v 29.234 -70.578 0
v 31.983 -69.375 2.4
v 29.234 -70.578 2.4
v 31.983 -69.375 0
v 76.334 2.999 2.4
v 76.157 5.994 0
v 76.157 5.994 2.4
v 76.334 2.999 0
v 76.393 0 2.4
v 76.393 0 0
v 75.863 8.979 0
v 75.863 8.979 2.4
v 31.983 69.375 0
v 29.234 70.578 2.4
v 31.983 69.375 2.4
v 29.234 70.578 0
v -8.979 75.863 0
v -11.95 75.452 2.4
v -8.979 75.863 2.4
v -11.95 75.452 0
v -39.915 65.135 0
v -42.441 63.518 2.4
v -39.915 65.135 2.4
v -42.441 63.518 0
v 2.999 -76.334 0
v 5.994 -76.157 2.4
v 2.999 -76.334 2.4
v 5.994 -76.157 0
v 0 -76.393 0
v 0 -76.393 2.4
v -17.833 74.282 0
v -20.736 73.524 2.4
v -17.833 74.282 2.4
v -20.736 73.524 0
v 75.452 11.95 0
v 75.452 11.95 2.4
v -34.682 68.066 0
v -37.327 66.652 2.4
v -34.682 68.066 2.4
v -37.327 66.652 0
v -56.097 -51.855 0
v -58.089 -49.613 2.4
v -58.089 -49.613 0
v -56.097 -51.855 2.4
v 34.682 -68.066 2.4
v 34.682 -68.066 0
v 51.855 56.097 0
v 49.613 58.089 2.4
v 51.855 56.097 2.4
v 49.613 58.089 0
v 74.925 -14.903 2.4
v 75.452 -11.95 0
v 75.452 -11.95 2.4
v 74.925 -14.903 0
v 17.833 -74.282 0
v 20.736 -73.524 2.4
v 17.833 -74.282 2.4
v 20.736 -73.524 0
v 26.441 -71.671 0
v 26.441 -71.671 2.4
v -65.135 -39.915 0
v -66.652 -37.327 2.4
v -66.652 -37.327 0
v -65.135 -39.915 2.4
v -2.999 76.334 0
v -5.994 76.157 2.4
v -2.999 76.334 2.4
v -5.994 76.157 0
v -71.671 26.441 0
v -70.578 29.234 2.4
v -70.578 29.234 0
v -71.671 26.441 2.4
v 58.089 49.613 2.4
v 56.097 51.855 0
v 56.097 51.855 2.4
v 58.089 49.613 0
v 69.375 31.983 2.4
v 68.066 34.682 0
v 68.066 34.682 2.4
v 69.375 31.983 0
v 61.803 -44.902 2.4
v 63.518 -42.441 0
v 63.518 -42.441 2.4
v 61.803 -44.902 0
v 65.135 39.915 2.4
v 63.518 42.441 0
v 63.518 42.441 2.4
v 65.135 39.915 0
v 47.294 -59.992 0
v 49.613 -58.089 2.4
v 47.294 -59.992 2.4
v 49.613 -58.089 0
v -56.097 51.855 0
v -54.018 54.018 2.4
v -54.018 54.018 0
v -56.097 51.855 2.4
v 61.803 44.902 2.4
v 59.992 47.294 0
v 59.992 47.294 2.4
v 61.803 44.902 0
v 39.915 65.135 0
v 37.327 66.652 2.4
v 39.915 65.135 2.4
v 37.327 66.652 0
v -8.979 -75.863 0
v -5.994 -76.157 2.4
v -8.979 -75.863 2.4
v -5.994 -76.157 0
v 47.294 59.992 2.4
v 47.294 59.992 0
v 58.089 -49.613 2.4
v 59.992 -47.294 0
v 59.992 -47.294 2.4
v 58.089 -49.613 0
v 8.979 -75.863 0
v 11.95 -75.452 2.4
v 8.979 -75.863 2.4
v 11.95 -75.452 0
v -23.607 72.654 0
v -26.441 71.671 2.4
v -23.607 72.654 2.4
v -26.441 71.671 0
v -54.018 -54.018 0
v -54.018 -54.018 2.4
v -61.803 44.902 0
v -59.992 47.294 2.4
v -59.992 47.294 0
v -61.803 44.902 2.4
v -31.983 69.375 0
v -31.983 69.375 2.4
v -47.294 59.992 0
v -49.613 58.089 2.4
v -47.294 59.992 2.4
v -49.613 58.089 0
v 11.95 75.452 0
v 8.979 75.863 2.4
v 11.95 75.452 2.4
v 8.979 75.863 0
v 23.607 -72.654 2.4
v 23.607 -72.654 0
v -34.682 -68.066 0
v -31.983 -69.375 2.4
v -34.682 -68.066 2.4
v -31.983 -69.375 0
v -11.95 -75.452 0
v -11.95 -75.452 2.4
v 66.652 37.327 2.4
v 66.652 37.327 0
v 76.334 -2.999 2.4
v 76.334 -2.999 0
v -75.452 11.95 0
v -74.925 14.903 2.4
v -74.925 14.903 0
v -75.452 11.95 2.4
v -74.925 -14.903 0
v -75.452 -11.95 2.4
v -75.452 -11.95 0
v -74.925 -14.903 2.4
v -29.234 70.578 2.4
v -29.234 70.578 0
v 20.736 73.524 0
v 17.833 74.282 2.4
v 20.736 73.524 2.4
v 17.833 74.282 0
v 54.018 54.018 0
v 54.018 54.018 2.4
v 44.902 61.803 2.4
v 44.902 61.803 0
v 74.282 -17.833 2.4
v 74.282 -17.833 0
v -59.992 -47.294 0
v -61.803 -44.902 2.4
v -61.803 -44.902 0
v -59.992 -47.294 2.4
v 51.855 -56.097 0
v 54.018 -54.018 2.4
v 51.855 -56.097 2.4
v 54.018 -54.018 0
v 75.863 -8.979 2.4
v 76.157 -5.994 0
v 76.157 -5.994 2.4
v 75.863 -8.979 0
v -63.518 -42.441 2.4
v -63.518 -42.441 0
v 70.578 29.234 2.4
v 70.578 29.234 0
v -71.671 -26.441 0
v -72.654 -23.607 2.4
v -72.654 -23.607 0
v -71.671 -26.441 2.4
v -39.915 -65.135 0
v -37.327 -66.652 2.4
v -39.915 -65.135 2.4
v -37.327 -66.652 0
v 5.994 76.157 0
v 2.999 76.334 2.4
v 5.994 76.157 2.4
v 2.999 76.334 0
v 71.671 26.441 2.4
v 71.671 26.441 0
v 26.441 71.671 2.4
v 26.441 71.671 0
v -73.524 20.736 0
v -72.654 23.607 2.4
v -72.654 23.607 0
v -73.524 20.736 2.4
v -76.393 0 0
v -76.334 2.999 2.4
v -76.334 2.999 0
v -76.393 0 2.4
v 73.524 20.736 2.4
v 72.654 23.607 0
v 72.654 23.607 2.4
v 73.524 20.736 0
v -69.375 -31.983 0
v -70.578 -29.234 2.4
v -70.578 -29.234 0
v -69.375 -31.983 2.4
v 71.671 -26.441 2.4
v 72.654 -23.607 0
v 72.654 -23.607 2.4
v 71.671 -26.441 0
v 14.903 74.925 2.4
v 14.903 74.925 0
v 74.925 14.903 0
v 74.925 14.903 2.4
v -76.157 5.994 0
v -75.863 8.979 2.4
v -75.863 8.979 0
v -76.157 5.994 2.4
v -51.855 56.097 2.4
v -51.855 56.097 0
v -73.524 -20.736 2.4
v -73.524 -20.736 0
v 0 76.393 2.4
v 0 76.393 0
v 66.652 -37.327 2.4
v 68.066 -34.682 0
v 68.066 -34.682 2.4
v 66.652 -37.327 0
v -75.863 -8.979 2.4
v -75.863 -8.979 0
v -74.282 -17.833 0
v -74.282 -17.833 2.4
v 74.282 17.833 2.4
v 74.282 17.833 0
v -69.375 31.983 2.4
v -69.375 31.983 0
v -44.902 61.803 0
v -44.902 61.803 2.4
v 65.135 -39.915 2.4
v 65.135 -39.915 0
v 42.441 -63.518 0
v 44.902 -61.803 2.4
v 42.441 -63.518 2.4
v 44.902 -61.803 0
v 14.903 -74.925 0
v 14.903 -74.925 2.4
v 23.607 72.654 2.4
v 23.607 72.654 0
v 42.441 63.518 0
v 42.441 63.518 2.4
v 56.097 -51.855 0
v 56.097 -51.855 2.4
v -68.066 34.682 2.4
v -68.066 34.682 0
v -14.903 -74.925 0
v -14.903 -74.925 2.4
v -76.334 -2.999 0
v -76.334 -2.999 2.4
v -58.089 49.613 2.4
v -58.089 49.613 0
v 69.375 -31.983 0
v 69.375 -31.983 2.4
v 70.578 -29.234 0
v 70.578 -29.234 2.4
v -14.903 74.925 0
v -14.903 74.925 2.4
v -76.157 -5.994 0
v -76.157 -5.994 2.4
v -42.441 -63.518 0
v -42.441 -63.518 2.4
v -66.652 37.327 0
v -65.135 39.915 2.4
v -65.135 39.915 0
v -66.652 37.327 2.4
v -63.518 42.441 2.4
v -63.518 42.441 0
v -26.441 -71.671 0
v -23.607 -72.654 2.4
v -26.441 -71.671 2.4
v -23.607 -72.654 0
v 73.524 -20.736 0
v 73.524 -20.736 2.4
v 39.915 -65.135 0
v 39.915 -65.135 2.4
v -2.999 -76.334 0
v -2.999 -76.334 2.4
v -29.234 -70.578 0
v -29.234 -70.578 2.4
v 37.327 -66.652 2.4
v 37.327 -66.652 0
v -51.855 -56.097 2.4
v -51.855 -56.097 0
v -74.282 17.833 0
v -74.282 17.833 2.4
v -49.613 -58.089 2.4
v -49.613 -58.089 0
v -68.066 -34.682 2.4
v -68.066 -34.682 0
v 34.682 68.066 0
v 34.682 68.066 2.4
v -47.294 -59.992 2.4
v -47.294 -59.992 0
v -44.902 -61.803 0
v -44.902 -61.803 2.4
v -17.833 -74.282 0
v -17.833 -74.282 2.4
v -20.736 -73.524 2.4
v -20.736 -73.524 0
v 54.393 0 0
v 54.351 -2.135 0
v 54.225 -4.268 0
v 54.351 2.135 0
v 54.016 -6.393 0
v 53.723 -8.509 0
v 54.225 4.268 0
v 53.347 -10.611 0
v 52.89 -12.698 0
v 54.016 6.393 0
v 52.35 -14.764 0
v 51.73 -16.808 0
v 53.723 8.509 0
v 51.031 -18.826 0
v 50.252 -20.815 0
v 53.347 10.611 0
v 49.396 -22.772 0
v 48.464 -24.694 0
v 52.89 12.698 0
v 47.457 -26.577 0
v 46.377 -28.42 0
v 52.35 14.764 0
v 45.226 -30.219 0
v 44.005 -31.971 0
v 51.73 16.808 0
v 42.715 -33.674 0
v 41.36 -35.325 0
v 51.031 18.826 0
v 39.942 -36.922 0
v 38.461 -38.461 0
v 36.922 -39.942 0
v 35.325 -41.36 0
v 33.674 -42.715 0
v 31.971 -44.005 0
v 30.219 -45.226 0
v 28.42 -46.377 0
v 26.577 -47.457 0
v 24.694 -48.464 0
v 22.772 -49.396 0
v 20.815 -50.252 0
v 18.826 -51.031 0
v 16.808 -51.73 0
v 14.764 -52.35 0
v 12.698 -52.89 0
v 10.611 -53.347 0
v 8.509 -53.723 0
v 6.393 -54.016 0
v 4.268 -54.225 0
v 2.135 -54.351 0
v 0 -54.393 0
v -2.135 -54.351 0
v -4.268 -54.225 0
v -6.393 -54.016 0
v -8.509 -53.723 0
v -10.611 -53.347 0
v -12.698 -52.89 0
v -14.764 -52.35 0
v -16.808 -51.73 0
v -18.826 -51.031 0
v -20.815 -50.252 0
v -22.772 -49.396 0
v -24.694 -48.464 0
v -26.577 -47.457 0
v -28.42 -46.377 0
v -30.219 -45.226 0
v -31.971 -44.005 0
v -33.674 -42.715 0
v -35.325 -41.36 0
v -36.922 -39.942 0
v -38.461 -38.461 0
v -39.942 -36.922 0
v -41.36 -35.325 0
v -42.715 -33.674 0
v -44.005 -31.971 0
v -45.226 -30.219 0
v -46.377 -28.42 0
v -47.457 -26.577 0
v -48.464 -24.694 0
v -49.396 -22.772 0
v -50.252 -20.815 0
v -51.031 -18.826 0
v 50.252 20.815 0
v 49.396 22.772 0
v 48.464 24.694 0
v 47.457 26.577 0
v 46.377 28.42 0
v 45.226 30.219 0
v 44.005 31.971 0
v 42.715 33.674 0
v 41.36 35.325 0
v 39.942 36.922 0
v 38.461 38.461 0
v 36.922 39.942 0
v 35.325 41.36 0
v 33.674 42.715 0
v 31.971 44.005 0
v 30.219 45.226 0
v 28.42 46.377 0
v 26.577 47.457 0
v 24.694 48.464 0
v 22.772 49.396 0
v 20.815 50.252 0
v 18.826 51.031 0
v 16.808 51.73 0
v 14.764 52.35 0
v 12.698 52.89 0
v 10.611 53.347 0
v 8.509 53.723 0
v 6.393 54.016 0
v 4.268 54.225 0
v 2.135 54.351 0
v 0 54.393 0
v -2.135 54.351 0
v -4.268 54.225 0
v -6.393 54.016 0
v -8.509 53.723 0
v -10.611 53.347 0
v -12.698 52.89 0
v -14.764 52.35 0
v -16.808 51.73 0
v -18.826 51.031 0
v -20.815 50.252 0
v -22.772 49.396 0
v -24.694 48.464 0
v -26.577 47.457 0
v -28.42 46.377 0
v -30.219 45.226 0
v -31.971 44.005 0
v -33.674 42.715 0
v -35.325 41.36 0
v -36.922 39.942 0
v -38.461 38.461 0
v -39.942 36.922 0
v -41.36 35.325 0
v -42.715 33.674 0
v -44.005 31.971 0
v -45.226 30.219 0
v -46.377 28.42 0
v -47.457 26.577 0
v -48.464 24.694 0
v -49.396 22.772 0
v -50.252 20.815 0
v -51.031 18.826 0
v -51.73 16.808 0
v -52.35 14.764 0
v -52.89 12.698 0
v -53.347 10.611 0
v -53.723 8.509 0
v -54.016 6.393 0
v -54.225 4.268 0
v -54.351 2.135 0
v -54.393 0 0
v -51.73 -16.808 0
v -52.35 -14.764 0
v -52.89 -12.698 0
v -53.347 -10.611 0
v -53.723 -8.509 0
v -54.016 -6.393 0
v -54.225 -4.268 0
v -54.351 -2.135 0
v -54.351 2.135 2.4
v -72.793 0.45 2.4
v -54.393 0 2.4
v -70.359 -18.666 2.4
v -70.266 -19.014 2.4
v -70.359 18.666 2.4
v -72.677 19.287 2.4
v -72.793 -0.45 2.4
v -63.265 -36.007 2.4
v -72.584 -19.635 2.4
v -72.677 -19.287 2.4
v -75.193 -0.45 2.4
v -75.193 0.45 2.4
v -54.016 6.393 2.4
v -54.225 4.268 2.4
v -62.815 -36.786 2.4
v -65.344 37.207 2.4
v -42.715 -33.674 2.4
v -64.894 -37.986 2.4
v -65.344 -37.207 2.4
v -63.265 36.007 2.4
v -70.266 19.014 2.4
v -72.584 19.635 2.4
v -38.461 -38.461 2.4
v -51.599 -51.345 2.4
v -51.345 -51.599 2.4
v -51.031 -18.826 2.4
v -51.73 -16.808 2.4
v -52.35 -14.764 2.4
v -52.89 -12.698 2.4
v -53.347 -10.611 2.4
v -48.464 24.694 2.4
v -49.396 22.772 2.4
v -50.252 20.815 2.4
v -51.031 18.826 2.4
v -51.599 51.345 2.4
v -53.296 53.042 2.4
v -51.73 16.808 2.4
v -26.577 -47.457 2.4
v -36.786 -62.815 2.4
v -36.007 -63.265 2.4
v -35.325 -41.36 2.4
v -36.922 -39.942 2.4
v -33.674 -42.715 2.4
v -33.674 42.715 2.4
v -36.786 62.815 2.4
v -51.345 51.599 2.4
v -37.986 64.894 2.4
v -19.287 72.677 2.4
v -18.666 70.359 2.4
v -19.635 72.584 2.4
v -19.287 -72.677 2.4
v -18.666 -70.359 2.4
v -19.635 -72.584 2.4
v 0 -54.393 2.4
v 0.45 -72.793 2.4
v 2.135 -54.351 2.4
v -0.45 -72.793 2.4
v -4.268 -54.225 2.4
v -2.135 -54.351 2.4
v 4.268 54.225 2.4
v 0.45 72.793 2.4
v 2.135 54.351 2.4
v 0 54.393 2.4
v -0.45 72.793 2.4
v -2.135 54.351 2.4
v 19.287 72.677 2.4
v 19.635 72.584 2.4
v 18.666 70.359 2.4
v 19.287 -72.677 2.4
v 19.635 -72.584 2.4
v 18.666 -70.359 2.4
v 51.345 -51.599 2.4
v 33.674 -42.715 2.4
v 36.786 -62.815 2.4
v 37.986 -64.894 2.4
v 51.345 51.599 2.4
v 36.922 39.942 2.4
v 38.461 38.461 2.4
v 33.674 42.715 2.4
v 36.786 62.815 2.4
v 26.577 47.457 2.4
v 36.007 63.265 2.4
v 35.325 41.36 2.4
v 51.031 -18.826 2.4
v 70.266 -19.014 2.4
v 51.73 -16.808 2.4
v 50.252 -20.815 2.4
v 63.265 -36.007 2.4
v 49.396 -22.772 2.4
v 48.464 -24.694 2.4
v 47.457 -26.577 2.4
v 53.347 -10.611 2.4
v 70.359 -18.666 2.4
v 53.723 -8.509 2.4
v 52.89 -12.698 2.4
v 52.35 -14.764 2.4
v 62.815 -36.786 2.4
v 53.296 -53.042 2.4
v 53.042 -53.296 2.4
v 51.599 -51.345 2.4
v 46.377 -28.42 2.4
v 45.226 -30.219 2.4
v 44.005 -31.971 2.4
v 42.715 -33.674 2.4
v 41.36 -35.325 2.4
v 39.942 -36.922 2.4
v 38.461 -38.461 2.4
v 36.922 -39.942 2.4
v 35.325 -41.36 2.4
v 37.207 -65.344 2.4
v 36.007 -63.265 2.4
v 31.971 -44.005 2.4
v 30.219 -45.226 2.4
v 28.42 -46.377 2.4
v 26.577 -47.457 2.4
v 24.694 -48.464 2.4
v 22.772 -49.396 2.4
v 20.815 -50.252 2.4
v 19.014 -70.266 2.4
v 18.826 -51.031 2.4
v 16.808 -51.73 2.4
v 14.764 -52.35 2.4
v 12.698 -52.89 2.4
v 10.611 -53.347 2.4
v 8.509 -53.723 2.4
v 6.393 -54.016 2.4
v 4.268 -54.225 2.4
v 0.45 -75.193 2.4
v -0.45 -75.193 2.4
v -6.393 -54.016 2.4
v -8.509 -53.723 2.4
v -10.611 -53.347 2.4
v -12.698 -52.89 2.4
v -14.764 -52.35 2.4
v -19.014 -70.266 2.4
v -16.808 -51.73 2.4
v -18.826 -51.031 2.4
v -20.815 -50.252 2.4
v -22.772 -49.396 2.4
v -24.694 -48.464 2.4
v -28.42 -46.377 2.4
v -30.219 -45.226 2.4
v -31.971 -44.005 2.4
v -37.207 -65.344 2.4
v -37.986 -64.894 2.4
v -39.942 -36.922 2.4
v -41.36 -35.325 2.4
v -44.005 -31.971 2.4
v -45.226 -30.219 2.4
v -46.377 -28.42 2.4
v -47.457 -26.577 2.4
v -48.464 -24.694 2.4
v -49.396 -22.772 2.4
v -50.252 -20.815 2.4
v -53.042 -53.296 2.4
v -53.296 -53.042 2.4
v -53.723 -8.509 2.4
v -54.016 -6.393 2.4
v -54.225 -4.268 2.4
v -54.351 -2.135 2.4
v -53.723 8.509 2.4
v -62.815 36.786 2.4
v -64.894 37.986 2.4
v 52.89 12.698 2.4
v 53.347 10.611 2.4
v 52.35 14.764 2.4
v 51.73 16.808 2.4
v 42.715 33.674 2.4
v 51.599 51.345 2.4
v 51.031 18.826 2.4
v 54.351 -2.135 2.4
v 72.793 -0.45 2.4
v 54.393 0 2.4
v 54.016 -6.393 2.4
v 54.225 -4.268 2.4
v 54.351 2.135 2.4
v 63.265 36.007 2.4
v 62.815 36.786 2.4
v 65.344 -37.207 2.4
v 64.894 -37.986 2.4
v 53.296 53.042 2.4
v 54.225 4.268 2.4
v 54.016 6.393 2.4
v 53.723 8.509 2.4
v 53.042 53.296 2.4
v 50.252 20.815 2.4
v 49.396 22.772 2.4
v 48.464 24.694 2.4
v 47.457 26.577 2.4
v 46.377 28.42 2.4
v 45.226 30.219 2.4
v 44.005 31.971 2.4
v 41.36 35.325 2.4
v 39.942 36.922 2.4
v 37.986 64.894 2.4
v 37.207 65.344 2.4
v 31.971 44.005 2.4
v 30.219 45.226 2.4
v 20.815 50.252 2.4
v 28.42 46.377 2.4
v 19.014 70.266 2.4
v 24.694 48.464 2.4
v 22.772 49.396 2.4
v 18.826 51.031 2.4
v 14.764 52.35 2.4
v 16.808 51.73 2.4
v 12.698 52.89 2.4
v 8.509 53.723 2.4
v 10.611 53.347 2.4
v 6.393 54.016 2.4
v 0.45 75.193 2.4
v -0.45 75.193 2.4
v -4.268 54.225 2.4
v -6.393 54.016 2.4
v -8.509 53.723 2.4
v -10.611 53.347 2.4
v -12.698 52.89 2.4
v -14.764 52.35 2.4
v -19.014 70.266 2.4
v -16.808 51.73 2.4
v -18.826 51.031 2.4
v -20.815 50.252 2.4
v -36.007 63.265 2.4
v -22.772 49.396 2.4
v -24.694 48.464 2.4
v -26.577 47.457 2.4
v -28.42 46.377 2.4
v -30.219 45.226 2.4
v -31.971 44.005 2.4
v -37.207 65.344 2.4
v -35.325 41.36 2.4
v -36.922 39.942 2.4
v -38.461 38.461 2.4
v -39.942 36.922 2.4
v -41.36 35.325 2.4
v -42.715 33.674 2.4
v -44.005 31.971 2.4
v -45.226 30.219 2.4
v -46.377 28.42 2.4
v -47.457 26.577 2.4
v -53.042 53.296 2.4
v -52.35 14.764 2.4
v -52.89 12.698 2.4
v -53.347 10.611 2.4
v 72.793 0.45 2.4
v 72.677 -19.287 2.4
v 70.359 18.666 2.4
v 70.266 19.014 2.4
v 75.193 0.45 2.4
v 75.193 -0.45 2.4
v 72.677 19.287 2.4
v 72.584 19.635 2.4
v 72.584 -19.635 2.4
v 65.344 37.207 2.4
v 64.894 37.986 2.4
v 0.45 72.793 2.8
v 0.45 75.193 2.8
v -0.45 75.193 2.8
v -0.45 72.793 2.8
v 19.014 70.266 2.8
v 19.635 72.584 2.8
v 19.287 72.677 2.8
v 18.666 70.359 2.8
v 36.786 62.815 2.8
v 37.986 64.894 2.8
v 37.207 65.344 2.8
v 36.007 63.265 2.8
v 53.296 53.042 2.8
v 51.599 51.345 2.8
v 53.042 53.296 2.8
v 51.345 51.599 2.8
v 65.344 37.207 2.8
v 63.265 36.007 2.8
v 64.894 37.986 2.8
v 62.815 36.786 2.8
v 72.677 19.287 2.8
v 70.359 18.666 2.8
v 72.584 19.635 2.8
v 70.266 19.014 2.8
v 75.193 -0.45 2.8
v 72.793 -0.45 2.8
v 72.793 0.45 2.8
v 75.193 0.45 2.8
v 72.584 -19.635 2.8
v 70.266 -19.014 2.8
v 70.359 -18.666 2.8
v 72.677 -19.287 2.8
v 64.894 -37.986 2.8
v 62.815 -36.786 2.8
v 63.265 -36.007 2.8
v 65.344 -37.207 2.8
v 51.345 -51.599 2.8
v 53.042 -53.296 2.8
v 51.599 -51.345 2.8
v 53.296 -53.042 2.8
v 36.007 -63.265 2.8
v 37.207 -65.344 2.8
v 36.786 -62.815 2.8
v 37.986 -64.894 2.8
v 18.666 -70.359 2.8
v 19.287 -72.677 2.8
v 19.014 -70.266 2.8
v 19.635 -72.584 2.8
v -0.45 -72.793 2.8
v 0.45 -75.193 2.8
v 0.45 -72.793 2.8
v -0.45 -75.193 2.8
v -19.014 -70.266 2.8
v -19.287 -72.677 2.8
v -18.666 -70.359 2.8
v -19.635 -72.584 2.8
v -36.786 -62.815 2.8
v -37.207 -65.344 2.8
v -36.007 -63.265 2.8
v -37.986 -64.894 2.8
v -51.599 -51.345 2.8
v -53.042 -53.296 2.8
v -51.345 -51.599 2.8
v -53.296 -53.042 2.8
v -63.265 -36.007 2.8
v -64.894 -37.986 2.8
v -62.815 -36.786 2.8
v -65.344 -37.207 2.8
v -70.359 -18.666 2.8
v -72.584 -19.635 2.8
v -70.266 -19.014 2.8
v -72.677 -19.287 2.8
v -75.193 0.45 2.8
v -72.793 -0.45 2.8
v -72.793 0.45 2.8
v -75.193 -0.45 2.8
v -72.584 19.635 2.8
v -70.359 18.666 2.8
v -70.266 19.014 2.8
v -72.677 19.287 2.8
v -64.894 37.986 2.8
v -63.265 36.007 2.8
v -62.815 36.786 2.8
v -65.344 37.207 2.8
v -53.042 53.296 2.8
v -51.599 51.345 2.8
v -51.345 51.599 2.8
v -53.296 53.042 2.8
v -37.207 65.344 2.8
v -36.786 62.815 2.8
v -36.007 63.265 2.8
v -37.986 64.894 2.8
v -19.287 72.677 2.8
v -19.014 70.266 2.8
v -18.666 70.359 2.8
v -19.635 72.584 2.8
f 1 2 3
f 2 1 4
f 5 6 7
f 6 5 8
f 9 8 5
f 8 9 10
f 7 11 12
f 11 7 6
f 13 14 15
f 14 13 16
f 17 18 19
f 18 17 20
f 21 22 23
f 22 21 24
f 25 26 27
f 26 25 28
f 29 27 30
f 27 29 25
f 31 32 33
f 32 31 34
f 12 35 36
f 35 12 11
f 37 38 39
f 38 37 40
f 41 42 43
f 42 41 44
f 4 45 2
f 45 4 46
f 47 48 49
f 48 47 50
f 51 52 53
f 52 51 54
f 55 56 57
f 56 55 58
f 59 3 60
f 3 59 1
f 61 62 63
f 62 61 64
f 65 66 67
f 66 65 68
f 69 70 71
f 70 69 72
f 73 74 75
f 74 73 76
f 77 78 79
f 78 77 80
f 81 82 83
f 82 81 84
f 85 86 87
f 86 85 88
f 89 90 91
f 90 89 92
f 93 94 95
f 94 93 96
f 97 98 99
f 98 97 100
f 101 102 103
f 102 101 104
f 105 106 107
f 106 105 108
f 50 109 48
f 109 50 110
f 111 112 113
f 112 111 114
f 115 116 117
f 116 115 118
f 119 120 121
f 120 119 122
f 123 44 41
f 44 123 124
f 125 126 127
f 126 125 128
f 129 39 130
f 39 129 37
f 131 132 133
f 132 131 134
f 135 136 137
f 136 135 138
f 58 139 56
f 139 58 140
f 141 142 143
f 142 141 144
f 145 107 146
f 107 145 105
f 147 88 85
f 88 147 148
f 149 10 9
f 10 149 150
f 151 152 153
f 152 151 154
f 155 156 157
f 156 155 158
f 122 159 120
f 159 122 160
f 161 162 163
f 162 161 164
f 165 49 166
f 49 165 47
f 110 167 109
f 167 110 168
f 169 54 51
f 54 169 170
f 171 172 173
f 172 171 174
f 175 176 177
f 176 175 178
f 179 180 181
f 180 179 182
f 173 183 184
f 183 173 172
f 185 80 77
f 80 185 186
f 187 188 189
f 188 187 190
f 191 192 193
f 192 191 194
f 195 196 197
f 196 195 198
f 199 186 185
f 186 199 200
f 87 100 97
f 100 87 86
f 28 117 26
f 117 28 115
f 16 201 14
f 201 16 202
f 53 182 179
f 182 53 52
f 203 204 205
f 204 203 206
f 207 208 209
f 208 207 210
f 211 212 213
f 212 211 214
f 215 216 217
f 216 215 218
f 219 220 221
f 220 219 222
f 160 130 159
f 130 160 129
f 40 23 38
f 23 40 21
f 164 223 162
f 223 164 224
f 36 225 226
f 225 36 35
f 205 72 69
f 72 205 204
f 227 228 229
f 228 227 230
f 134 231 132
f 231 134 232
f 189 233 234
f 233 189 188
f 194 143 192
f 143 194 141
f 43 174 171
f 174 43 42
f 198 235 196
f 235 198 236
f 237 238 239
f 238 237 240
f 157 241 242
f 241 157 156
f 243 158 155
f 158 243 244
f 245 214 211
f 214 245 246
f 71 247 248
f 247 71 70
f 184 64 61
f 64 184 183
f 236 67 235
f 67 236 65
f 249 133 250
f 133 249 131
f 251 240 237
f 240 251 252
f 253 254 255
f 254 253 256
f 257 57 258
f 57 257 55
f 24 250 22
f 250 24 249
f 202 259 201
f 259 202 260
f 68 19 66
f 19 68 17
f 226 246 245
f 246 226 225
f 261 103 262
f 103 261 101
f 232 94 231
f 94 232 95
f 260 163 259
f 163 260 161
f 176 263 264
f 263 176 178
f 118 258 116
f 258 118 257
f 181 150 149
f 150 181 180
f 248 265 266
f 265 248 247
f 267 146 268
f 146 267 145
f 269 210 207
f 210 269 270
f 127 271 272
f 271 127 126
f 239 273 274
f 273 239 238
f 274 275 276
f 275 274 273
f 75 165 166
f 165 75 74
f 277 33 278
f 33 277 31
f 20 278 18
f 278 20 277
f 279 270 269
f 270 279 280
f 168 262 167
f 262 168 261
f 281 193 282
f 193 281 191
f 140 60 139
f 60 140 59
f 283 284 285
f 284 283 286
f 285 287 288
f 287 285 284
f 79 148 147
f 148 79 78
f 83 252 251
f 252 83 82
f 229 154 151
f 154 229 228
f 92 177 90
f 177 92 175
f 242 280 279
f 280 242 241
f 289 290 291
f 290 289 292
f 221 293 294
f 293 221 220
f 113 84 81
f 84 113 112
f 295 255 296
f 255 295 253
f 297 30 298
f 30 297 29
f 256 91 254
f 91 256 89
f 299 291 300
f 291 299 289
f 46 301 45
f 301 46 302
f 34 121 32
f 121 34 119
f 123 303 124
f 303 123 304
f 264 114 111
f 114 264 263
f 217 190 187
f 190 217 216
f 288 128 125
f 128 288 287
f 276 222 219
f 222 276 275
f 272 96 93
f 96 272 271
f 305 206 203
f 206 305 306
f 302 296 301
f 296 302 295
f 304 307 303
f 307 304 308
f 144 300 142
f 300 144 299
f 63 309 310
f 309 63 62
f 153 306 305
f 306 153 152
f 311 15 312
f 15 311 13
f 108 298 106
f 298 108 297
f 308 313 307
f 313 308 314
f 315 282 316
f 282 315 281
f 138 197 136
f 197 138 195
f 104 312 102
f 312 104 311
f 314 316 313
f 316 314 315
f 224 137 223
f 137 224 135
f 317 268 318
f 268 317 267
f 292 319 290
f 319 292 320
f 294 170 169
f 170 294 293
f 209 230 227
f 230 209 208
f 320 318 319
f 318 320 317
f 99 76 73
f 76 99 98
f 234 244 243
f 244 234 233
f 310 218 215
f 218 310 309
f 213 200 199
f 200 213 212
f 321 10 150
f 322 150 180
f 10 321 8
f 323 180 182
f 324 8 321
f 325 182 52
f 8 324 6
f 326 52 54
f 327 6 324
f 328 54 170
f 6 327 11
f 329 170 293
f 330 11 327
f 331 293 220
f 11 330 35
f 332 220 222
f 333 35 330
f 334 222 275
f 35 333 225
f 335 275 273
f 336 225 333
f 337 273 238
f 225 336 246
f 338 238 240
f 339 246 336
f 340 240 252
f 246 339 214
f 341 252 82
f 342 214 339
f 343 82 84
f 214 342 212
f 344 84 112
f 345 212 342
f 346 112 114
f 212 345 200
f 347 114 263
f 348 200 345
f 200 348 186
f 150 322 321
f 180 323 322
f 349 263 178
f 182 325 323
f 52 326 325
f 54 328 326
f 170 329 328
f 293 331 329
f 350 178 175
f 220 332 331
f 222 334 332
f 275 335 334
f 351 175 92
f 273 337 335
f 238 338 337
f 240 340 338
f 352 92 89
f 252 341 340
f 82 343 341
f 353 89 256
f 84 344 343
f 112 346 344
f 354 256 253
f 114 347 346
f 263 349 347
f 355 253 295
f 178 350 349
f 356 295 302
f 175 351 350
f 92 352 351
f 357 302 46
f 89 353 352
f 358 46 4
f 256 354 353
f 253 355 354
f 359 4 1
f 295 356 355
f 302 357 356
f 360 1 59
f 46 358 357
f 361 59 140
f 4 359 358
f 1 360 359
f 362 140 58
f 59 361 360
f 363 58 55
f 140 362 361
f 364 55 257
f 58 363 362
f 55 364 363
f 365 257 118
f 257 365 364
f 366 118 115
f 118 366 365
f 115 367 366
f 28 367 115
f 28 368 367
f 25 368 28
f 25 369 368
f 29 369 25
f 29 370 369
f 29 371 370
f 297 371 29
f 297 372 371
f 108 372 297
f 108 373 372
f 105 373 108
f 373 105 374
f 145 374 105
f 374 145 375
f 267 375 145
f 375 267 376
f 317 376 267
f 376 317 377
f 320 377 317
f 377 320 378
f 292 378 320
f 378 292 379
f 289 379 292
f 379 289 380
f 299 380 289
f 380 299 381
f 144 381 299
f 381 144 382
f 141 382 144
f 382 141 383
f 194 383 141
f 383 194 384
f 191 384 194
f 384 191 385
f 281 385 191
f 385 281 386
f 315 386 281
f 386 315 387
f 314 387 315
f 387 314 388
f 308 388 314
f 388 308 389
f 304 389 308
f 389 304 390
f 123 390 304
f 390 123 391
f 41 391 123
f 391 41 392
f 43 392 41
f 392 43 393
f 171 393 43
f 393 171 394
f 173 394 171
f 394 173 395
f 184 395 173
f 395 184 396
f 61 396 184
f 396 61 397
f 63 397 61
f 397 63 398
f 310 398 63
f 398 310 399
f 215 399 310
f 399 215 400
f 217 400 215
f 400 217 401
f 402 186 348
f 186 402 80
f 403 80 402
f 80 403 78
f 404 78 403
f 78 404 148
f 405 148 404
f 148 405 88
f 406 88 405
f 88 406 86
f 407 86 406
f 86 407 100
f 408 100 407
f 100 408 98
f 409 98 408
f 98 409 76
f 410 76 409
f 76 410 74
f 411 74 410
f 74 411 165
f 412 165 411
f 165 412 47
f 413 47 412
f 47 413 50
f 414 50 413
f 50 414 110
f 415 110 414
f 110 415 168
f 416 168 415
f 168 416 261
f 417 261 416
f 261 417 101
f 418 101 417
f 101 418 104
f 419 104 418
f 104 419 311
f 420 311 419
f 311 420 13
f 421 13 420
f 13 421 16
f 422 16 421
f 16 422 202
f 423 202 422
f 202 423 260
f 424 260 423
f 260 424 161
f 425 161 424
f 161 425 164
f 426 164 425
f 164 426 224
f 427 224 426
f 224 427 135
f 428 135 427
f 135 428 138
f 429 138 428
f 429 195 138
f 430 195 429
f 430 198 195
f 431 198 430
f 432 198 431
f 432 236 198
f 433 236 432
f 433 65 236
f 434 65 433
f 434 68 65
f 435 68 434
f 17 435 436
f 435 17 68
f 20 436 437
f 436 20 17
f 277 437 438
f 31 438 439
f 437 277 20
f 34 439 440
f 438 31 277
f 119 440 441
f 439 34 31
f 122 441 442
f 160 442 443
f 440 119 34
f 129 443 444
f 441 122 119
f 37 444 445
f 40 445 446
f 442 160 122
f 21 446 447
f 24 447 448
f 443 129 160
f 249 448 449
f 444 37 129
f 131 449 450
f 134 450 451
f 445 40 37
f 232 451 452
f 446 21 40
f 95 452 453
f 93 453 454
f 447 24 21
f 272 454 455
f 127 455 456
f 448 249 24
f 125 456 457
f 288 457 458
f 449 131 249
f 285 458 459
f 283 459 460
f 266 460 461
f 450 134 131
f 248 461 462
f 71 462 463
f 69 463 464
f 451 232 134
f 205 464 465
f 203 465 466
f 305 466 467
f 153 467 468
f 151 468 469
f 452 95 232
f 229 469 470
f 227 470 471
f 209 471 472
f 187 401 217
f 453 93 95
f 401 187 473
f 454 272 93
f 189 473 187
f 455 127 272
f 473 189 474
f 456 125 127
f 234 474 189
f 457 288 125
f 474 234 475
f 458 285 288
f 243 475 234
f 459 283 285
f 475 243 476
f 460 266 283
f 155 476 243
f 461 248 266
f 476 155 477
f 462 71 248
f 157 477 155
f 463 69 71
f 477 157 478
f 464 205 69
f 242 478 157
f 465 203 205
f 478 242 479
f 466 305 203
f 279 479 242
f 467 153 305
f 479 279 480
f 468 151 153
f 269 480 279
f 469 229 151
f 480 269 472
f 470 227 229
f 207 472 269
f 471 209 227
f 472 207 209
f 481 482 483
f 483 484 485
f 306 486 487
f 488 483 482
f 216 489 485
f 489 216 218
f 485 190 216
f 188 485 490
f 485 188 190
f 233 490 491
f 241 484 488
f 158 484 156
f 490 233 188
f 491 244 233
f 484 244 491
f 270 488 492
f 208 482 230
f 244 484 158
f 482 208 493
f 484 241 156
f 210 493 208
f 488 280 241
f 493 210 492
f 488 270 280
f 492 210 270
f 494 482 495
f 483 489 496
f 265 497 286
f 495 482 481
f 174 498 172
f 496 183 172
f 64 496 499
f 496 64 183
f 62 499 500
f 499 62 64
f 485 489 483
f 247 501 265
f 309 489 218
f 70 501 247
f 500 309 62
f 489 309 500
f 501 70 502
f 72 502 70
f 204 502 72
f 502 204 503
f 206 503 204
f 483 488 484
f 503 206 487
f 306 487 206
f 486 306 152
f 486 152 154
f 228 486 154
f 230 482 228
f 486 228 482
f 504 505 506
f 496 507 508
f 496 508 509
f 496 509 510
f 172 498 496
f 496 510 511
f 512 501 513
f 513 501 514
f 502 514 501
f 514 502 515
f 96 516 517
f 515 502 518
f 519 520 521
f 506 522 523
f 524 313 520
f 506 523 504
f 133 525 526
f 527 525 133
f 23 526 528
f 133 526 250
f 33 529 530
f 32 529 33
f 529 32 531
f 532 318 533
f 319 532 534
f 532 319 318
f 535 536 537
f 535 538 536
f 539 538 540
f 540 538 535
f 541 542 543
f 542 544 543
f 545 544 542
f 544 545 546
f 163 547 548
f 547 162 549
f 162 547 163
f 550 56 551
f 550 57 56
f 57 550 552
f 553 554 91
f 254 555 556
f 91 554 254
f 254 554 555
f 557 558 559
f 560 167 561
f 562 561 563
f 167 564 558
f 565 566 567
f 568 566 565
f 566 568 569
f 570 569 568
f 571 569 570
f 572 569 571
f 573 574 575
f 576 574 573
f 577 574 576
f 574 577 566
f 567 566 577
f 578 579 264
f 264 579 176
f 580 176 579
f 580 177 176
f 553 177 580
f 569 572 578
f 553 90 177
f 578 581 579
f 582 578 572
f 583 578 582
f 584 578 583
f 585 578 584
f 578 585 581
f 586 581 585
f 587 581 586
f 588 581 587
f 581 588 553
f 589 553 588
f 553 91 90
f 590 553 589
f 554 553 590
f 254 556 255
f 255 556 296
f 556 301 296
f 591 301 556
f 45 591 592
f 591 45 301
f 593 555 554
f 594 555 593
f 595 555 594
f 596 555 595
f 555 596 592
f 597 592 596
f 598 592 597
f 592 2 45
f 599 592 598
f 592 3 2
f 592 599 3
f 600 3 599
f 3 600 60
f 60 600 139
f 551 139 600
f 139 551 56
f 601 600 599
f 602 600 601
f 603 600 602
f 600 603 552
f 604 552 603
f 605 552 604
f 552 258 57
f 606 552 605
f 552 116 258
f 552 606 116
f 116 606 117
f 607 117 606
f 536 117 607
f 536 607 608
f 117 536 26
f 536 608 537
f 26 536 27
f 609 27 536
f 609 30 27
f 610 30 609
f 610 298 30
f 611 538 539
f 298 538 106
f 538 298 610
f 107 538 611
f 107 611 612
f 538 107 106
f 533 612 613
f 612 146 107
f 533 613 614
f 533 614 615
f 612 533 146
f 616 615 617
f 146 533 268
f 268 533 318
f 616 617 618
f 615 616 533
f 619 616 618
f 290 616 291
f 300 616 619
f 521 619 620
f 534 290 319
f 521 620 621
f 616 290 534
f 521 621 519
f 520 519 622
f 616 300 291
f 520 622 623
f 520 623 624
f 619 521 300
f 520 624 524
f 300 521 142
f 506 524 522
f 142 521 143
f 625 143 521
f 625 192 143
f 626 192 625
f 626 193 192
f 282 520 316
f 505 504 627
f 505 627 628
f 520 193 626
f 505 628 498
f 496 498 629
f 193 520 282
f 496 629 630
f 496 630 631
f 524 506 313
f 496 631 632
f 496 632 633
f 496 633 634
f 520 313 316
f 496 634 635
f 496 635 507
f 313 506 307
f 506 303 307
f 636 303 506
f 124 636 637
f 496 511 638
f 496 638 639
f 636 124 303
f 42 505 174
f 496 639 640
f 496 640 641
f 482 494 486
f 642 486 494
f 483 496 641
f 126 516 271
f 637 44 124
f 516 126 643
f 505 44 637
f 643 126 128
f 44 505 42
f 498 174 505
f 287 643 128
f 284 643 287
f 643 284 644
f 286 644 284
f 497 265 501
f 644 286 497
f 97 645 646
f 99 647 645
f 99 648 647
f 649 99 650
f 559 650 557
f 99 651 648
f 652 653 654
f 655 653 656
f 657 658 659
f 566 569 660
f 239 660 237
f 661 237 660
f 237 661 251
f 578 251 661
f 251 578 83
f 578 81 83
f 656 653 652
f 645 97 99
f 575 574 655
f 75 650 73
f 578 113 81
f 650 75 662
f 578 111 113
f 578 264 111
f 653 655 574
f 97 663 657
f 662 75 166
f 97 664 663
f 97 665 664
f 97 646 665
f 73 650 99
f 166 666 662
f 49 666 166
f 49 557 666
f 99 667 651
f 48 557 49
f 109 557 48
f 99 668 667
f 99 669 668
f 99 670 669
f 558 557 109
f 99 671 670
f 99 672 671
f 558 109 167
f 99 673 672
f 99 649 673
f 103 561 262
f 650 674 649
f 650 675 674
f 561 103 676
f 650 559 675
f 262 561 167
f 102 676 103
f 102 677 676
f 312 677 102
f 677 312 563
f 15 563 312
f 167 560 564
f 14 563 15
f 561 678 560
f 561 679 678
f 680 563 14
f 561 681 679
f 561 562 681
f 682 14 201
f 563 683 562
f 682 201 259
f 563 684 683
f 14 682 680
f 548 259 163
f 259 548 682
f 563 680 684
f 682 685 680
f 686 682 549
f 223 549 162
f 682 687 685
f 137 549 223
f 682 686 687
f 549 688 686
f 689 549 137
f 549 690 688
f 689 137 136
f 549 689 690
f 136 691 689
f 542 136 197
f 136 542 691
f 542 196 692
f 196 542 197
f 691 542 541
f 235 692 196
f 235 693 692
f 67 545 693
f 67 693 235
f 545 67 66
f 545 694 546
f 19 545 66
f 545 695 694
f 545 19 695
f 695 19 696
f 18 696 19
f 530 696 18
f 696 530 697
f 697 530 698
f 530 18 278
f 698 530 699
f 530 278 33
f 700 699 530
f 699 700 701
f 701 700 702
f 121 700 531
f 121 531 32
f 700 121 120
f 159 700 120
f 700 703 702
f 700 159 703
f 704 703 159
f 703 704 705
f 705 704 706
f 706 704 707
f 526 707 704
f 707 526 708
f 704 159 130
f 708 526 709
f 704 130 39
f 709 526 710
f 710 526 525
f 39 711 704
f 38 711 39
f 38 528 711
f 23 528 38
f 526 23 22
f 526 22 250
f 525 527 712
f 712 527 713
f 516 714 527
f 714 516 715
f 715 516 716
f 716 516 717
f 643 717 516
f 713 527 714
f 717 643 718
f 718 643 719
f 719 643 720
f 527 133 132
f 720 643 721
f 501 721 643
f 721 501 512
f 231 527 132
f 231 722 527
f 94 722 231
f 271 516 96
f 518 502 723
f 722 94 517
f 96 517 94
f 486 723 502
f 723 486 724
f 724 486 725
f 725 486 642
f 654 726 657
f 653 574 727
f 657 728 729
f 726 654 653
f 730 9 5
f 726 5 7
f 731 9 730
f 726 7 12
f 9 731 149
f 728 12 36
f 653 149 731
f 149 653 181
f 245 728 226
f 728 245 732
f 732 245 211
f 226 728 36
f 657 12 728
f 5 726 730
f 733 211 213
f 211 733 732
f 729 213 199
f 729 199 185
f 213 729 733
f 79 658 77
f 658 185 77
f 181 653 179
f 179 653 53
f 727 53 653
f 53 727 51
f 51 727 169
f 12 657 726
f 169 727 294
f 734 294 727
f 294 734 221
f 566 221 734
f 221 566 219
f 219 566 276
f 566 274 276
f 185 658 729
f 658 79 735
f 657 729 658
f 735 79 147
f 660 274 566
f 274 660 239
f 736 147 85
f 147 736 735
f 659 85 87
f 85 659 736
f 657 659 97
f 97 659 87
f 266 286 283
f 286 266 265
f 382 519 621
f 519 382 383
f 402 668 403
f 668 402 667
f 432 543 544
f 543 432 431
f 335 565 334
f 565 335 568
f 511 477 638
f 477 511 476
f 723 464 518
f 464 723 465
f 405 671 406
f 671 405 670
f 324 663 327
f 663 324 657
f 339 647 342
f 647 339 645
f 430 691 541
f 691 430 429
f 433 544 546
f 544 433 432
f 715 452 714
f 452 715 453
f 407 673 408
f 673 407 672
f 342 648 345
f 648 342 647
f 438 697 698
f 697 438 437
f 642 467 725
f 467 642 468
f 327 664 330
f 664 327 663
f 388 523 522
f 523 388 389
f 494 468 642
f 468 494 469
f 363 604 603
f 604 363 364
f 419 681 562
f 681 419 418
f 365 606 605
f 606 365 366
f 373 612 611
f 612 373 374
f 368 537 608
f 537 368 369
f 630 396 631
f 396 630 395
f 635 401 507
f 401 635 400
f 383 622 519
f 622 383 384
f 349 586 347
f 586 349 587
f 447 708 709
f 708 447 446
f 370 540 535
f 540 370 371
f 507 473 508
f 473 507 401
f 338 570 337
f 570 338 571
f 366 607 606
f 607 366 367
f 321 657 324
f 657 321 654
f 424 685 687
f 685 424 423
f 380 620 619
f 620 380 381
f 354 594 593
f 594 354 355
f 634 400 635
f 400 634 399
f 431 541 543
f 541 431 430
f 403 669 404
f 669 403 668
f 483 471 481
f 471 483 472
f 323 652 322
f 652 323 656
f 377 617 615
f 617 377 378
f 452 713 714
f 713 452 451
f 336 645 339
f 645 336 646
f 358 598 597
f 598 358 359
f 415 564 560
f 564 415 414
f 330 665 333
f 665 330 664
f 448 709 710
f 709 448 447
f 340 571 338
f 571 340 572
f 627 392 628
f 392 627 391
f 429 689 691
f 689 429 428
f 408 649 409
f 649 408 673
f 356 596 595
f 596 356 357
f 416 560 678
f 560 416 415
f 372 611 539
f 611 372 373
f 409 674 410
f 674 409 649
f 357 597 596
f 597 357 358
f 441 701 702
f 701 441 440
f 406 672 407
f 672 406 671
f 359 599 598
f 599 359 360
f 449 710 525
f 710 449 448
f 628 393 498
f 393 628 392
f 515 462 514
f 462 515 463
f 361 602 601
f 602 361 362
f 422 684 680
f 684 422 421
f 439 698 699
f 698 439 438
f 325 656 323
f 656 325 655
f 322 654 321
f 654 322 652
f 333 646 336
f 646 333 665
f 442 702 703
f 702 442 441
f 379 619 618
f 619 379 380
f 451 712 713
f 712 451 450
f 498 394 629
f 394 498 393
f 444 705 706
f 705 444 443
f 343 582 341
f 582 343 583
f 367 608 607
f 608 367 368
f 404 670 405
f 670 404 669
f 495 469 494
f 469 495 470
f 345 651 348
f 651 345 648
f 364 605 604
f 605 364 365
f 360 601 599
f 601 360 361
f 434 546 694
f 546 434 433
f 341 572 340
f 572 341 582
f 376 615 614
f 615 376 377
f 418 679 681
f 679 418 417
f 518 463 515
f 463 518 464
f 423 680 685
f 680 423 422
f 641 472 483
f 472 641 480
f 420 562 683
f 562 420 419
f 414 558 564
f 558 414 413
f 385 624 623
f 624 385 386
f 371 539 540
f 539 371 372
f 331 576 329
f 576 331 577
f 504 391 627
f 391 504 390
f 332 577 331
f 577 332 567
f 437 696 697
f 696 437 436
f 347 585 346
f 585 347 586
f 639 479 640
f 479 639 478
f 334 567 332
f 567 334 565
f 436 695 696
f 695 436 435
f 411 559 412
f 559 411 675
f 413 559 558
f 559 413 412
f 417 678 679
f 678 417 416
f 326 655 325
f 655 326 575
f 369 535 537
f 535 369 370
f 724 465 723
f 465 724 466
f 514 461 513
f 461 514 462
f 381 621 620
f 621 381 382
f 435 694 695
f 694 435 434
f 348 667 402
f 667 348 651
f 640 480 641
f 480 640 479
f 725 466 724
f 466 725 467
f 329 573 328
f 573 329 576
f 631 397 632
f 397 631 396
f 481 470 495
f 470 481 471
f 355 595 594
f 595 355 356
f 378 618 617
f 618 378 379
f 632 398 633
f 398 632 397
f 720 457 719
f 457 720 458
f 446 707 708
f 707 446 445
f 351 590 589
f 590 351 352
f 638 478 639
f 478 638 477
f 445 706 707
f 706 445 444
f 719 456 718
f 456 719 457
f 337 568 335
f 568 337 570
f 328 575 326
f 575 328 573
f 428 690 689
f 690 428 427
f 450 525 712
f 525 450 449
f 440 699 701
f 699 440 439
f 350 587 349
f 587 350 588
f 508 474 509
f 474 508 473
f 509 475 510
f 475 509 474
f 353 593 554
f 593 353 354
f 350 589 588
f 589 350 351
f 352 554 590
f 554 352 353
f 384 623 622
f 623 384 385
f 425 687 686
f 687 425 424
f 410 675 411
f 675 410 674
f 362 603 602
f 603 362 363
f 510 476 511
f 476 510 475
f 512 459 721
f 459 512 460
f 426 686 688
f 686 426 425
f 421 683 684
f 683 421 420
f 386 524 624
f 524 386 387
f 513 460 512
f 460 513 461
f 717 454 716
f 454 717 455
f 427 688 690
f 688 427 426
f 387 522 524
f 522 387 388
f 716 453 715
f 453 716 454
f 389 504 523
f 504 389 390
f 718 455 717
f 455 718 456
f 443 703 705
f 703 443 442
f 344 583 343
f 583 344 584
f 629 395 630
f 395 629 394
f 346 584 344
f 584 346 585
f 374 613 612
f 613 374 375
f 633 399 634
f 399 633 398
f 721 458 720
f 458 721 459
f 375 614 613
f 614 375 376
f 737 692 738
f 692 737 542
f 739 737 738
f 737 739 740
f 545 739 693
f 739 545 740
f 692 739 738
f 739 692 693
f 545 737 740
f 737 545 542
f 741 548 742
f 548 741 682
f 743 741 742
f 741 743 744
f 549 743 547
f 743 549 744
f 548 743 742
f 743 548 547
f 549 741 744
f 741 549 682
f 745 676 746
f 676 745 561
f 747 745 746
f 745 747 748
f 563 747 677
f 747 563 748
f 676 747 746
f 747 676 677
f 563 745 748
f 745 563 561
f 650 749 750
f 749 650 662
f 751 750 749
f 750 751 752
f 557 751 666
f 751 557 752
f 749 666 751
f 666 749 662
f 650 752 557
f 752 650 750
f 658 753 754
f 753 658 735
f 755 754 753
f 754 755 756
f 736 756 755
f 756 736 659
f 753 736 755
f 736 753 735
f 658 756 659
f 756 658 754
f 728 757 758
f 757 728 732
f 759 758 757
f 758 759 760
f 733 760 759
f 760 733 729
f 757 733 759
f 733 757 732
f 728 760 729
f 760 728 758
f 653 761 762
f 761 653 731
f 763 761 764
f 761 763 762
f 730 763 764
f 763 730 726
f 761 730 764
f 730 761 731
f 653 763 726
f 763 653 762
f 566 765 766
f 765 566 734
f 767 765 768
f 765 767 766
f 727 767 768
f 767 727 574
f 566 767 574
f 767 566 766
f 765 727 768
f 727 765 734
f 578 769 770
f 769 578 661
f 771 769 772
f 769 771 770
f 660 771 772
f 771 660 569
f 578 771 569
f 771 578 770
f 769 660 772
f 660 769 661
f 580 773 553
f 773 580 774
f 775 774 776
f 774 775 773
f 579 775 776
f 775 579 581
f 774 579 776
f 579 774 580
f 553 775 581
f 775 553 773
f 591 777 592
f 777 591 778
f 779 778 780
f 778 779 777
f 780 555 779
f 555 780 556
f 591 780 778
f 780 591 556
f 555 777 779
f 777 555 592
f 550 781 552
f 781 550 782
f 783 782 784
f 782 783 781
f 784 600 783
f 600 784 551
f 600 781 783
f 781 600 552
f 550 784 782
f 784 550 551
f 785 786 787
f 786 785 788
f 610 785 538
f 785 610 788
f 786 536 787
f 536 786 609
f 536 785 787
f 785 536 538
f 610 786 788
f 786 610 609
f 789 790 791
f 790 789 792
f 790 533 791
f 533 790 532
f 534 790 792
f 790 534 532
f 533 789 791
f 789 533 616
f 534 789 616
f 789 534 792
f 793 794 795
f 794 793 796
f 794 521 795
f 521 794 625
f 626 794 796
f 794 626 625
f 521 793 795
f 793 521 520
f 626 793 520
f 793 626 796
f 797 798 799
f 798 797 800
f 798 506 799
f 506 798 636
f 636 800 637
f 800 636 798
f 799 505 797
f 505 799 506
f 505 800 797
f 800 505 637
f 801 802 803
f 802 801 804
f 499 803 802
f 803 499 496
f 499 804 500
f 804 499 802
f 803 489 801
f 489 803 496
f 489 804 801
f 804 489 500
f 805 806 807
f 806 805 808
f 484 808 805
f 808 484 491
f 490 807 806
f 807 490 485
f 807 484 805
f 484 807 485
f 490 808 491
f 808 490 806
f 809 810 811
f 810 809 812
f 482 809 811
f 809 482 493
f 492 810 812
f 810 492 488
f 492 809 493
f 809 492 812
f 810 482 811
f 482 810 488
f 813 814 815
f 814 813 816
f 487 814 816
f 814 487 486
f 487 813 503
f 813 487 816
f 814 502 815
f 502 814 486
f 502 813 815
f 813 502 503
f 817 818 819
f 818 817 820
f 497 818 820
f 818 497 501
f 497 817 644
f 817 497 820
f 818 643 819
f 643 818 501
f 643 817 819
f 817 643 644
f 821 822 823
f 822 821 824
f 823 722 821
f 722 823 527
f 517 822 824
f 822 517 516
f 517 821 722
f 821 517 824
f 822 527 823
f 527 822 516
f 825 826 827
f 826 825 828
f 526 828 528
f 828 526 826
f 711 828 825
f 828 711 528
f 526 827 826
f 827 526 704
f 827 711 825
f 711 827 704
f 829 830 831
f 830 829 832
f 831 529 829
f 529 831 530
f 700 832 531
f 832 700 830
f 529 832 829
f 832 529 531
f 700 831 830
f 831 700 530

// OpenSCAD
// 24-LED legend collar - Blank
// Generated by build_legend.py. Edit that, not this.
//
// Every label is UPRIGHT - no rotation - so the collar reads
// from across the room whichever pixel you are looking at.
//
// Text is RAISED by TEXT_H. For a two-colour print, pause at
// PLATE_H and swap filament: the text starts exactly there.
//
// Bore is body dia 107.99 + 0.40 clearance.
$fn = 160;
PLATE_H = 2.4;
TEXT_H = 0.6;
TICK_H = 0.4;
R_IN = 54.3926;
R_OUT = 76.3926;

module plate() {
  difference() {
    cylinder(h = PLATE_H, r = R_OUT);
    translate([0, 0, -1]) cylinder(h = PLATE_H + 2, r = R_IN);
  }
}

// Upright: translate only, never rotate.
module lab(x, y, size, txt, bold = true) {
  translate([x, y, PLATE_H])
    linear_extrude(height = TEXT_H)
      text(txt, size = size, halign = "center",
           valign = "center", font = bold ?
           "DejaVu Sans:style=Bold" : "DejaVu Sans");
}

module ticks() {
  for (i = [0 : 23]) {
    a = i * 15.000000;
    major = (i % 2) == 0;
    rotate([0, 0, -a])
      translate([-(major ? 0.45 : 0.18), R_OUT - 3.6, PLATE_H])
        cube([major ? 0.9 : 0.36, 2.4, TICK_H]);
  }
}

module legend() {
  plate();
  ticks();
}

legend();
